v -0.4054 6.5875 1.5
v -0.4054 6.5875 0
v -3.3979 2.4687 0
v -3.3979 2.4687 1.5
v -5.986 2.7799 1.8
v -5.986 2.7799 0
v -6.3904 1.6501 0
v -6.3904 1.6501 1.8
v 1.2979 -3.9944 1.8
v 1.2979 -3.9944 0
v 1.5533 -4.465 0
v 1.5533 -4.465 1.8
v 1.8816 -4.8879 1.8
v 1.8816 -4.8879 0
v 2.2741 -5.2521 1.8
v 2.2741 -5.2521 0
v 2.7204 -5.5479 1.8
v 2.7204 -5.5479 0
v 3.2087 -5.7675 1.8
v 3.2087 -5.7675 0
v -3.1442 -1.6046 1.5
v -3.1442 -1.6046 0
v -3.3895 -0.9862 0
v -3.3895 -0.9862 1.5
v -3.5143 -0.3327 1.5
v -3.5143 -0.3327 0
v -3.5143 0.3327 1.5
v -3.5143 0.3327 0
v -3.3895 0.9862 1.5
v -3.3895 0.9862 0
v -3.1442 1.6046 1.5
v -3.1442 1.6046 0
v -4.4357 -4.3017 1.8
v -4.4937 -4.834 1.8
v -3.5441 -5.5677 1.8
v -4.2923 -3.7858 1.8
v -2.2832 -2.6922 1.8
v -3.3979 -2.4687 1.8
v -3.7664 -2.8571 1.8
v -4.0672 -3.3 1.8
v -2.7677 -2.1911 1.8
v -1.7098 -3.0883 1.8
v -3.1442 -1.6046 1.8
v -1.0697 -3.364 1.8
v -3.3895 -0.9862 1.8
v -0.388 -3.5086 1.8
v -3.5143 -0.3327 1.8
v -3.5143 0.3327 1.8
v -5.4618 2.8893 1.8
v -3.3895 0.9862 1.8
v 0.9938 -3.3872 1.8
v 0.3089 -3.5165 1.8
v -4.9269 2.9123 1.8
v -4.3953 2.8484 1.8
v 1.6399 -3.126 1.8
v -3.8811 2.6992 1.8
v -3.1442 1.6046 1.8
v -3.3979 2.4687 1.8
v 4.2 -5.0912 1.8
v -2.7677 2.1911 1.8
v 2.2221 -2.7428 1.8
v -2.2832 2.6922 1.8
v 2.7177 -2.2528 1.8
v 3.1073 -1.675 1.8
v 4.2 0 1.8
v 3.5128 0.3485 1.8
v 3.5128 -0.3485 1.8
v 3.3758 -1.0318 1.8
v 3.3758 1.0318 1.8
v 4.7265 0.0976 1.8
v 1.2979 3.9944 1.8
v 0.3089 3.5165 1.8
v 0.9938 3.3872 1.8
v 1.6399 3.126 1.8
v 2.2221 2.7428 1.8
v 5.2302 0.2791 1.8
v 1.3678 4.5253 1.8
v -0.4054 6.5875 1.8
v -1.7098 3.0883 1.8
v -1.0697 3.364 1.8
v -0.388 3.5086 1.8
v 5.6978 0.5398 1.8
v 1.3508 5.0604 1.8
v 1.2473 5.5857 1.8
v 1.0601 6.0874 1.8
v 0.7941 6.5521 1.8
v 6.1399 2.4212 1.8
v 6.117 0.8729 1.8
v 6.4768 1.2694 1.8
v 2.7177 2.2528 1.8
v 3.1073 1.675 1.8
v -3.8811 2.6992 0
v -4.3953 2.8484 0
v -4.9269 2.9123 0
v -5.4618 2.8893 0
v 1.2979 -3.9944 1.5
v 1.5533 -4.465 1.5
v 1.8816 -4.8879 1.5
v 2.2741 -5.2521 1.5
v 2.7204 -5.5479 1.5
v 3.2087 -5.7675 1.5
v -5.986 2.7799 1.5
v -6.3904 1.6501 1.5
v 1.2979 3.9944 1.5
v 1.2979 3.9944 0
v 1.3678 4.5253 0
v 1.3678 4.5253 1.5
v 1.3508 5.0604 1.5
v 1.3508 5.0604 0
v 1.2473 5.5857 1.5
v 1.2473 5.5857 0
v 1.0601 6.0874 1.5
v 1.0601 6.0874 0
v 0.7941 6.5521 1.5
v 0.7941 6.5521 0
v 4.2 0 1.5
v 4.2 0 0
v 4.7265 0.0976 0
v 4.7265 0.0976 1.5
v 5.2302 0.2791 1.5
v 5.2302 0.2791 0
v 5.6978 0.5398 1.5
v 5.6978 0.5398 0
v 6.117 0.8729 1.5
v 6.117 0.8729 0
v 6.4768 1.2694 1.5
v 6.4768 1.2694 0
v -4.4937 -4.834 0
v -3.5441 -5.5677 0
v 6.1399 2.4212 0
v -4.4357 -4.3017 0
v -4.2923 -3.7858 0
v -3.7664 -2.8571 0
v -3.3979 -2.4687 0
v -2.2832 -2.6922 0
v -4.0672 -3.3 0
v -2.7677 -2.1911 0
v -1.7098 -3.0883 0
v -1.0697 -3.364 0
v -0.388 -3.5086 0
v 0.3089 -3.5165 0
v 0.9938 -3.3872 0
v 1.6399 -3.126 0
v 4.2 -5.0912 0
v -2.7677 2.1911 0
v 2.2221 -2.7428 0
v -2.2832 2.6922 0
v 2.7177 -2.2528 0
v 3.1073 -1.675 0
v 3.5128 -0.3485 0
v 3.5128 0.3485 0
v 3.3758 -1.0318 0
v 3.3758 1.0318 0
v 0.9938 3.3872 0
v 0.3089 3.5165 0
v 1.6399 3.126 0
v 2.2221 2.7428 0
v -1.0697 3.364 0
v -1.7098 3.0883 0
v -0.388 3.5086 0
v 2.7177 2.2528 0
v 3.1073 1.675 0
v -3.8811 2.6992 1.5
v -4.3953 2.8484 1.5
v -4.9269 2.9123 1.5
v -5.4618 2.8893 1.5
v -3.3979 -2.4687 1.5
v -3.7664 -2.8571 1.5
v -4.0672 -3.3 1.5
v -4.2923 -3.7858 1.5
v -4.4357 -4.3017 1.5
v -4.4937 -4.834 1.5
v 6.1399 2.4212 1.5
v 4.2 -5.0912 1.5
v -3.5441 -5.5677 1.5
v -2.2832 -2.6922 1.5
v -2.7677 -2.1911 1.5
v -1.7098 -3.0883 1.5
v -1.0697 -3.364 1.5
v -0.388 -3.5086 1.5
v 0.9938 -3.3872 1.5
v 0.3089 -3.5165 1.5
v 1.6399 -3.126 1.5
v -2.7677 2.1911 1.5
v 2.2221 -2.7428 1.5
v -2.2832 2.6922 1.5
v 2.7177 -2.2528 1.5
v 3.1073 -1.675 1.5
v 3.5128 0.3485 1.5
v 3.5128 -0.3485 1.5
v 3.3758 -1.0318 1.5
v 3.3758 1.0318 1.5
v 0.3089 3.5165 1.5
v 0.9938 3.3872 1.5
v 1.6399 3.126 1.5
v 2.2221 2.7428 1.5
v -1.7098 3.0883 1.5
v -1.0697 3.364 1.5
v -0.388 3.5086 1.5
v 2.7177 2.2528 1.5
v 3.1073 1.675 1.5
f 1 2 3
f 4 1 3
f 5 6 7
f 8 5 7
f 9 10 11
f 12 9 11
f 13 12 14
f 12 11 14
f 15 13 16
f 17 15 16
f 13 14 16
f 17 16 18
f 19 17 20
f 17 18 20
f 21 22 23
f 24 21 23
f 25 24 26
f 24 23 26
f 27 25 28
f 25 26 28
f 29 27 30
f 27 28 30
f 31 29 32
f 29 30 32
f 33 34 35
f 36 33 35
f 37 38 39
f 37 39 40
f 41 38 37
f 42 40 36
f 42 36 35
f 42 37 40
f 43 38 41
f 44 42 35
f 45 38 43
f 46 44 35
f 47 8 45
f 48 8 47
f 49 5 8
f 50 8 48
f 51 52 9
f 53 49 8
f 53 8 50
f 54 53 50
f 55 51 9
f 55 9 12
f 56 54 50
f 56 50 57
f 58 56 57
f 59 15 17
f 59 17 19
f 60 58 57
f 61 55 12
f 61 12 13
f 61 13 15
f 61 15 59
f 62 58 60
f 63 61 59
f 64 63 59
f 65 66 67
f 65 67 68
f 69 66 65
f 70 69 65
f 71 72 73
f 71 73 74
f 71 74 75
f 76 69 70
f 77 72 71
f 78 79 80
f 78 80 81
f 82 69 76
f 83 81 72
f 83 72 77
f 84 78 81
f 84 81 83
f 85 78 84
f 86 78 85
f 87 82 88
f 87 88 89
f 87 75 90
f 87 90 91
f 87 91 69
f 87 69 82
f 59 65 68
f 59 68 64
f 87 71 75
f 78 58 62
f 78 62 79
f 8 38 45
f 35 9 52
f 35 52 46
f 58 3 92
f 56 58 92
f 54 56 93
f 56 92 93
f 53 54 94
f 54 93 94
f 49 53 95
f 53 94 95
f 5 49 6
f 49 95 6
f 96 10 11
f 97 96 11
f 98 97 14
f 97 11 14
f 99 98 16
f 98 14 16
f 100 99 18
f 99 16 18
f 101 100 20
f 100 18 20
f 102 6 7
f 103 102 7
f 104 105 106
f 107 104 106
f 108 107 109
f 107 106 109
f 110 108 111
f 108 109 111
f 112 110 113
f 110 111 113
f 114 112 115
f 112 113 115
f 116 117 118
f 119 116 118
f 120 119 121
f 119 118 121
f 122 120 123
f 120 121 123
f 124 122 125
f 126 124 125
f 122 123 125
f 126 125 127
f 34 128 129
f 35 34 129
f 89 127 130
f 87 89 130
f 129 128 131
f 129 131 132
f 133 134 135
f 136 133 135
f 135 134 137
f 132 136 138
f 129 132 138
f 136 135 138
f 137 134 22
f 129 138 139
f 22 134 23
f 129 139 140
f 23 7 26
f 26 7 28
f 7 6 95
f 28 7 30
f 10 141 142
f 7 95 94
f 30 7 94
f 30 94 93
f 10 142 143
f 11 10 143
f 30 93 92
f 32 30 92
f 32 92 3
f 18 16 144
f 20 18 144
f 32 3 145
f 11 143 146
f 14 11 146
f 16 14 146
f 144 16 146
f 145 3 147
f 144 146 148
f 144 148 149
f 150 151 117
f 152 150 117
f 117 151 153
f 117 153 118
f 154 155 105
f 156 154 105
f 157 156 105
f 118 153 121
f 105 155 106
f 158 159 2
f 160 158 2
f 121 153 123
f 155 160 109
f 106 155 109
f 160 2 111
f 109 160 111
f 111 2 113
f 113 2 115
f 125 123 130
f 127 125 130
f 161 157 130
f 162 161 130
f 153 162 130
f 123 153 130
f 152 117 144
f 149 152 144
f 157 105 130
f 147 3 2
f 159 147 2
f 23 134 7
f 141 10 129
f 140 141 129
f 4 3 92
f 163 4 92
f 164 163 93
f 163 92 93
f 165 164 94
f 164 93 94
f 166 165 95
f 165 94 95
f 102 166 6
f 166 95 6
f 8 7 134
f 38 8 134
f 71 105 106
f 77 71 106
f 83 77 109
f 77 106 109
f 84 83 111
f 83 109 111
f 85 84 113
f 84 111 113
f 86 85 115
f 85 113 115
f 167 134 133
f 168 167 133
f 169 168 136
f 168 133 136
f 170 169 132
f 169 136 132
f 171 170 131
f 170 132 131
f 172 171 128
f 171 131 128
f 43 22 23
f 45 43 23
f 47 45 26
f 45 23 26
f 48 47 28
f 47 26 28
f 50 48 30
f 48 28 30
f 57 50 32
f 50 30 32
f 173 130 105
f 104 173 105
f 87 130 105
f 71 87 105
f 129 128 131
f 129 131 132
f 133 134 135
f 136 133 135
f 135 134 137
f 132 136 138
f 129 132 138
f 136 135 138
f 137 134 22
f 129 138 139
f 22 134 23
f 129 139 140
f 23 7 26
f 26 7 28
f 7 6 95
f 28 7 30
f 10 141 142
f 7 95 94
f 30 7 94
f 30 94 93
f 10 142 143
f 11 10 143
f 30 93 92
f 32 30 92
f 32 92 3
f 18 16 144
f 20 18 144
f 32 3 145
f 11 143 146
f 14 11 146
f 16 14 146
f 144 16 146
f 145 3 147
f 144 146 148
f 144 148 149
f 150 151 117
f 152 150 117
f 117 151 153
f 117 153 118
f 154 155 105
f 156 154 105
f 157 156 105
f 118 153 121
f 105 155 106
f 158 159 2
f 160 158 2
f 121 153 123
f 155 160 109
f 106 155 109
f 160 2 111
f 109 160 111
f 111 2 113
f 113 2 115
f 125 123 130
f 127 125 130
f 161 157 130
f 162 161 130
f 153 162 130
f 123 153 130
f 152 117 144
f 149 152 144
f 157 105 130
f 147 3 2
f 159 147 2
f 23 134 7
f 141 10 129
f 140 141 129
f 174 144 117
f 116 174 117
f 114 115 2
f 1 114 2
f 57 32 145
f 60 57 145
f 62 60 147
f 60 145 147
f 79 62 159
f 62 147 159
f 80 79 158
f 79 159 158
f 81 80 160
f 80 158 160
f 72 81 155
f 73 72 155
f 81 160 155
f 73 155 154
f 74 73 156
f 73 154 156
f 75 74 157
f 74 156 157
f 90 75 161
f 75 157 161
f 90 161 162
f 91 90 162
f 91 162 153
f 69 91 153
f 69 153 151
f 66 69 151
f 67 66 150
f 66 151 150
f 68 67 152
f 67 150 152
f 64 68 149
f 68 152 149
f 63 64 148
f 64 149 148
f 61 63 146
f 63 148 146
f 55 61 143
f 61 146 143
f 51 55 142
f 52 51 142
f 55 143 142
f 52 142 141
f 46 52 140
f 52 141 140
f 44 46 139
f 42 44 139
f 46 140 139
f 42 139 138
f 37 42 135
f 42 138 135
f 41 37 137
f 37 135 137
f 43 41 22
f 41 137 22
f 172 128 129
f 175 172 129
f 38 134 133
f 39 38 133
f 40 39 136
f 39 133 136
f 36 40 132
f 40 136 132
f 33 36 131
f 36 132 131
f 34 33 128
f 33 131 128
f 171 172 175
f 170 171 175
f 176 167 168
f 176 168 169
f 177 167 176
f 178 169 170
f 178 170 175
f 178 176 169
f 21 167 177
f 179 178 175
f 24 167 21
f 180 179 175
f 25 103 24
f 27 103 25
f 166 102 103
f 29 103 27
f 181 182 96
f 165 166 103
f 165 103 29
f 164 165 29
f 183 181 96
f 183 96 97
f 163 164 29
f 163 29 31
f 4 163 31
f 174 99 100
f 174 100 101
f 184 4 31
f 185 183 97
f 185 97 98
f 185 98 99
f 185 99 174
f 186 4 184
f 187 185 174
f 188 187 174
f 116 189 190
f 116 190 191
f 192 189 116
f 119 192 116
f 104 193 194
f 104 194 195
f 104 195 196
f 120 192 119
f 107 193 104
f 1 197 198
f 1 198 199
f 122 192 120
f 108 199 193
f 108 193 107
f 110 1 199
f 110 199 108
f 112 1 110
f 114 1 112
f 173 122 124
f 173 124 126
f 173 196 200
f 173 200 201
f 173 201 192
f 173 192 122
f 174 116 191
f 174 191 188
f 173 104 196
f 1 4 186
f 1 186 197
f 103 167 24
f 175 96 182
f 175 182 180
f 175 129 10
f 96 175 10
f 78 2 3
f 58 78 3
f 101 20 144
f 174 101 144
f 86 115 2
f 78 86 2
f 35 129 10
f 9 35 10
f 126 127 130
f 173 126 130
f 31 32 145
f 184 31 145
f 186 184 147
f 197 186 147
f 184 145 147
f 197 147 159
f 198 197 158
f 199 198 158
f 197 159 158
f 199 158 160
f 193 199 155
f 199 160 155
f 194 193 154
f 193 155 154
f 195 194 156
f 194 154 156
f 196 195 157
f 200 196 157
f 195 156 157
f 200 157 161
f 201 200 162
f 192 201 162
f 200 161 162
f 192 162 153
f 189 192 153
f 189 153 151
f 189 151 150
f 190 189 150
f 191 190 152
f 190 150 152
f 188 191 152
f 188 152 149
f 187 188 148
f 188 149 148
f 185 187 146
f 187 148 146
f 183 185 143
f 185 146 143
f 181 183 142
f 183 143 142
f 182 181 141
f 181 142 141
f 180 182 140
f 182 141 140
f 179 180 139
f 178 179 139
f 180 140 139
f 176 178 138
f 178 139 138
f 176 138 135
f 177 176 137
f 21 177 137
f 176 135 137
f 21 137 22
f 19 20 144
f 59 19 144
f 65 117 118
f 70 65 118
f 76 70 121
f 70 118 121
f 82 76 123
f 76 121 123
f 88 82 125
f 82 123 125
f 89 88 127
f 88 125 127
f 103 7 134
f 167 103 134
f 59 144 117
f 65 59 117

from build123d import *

# Parameters (mm, degrees)
F1_DEPTH = 0.5
F2_DEPTH = 0.6
F3_SCALE = 3


with BuildPart() as f1:
    # F0 (on Top) → F1 (new body)
    with BuildSketch(Plane.XY):
        with BuildLine():
            Line((1.4, -1.6970562748), (1.4, 0))
            ThreePointArc((1.4, 0), (1.8230950904, 0.1333159957), (2.1589223358, 0.4231481393))
            Line((2.1589223358, 0.4231481393), (2.0466202208, 0.8070598935))
            Line((2.0466202208, 0.8070598935), (0.4326237921, 1.3314791228))
            ThreePointArc((0.4326237921, 1.3314791228), (0.4365763189, 1.7750633739), (0.264705896, 2.1840171219))
            Line((0.264705896, 2.1840171219), (-0.1351191415, 2.19584672))
            Line((-0.1351191415, 2.19584672), (-1.1326237921, 0.8228993532))
            ThreePointArc((-1.1326237921, 0.8228993532), (-1.5532760867, 0.9637335016), (-1.9953250951, 0.926648674))
            Line((-1.9953250951, 0.926648674), (-2.1301284428, 0.5500480136))
            Line((-2.1301284428, 0.5500480136), (-1.1326237921, -0.8228993532))
            ThreePointArc((-1.1326237921, -0.8228993532), (-1.3965537344, -1.1794433138), (-1.4978846234, -1.6113167457))
            Line((-1.4978846234, -1.6113167457), (-1.1813726366, -1.8558983522))
            Line((-1.1813726366, -1.8558983522), (0.4326237921, -1.3314791228))
            ThreePointArc((0.4326237921, -1.3314791228), (0.6901584117, -1.6926695573), (1.0695814866, -1.9224971895))
            Line((1.0695814866, -1.9224971895), (1.4, -1.6970562748))
        make_face()
        with BuildLine():
            ThreePointArc((-1.048070018, 0.5348772587), (1.1766666667, 0), (-1.048070018, -0.5348772587))
            ThreePointArc((-1.048070018, -0.5348772587), (-1.1766666667, 0), (-1.048070018, 0.5348772587))
        make_face(mode=Mode.SUBTRACT)
    extrude(amount=F1_DEPTH)


with BuildPart() as f2:
    # F0 (on Top) → F2 (new body)
    with BuildSketch(Plane.XY):
        with BuildLine():
            Line((1.4, -1.6970562748), (1.4, 0))
            ThreePointArc((1.4, 0), (1.8230950904, 0.1333159957), (2.1589223358, 0.4231481393))
            Line((2.1589223358, 0.4231481393), (2.0466202208, 0.8070598935))
            Line((2.0466202208, 0.8070598935), (0.4326237921, 1.3314791228))
            ThreePointArc((0.4326237921, 1.3314791228), (0.4365763189, 1.7750633739), (0.264705896, 2.1840171219))
            Line((0.264705896, 2.1840171219), (-0.1351191415, 2.19584672))
            Line((-0.1351191415, 2.19584672), (-1.1326237921, 0.8228993532))
            ThreePointArc((-1.1326237921, 0.8228993532), (-1.5532760867, 0.9637335016), (-1.9953250951, 0.926648674))
            Line((-1.9953250951, 0.926648674), (-2.1301284428, 0.5500480136))
            Line((-2.1301284428, 0.5500480136), (-1.1326237921, -0.8228993532))
            ThreePointArc((-1.1326237921, -0.8228993532), (-1.3965537344, -1.1794433138), (-1.4978846234, -1.6113167457))
            Line((-1.4978846234, -1.6113167457), (-1.1813726366, -1.8558983522))
            Line((-1.1813726366, -1.8558983522), (0.4326237921, -1.3314791228))
            ThreePointArc((0.4326237921, -1.3314791228), (0.6901584117, -1.6926695573), (1.0695814866, -1.9224971895))
            Line((1.0695814866, -1.9224971895), (1.4, -1.6970562748))
        make_face()
        with BuildLine():
            ThreePointArc((-1.048070018, 0.5348772587), (1.1766666667, 0), (-1.048070018, -0.5348772587))
            ThreePointArc((-1.048070018, -0.5348772587), (-1.1766666667, 0), (-1.048070018, 0.5348772587))
        make_face(mode=Mode.SUBTRACT)
    extrude(amount=F2_DEPTH)


with BuildPart() as f2_1:
    # F3: moved
    add(f2.part.scale(F3_SCALE))


with BuildPart() as f1_1:
    # F3: moved
    add(f1.part.scale(F3_SCALE))


solid = Compound([f2_1.part, f1_1.part])
